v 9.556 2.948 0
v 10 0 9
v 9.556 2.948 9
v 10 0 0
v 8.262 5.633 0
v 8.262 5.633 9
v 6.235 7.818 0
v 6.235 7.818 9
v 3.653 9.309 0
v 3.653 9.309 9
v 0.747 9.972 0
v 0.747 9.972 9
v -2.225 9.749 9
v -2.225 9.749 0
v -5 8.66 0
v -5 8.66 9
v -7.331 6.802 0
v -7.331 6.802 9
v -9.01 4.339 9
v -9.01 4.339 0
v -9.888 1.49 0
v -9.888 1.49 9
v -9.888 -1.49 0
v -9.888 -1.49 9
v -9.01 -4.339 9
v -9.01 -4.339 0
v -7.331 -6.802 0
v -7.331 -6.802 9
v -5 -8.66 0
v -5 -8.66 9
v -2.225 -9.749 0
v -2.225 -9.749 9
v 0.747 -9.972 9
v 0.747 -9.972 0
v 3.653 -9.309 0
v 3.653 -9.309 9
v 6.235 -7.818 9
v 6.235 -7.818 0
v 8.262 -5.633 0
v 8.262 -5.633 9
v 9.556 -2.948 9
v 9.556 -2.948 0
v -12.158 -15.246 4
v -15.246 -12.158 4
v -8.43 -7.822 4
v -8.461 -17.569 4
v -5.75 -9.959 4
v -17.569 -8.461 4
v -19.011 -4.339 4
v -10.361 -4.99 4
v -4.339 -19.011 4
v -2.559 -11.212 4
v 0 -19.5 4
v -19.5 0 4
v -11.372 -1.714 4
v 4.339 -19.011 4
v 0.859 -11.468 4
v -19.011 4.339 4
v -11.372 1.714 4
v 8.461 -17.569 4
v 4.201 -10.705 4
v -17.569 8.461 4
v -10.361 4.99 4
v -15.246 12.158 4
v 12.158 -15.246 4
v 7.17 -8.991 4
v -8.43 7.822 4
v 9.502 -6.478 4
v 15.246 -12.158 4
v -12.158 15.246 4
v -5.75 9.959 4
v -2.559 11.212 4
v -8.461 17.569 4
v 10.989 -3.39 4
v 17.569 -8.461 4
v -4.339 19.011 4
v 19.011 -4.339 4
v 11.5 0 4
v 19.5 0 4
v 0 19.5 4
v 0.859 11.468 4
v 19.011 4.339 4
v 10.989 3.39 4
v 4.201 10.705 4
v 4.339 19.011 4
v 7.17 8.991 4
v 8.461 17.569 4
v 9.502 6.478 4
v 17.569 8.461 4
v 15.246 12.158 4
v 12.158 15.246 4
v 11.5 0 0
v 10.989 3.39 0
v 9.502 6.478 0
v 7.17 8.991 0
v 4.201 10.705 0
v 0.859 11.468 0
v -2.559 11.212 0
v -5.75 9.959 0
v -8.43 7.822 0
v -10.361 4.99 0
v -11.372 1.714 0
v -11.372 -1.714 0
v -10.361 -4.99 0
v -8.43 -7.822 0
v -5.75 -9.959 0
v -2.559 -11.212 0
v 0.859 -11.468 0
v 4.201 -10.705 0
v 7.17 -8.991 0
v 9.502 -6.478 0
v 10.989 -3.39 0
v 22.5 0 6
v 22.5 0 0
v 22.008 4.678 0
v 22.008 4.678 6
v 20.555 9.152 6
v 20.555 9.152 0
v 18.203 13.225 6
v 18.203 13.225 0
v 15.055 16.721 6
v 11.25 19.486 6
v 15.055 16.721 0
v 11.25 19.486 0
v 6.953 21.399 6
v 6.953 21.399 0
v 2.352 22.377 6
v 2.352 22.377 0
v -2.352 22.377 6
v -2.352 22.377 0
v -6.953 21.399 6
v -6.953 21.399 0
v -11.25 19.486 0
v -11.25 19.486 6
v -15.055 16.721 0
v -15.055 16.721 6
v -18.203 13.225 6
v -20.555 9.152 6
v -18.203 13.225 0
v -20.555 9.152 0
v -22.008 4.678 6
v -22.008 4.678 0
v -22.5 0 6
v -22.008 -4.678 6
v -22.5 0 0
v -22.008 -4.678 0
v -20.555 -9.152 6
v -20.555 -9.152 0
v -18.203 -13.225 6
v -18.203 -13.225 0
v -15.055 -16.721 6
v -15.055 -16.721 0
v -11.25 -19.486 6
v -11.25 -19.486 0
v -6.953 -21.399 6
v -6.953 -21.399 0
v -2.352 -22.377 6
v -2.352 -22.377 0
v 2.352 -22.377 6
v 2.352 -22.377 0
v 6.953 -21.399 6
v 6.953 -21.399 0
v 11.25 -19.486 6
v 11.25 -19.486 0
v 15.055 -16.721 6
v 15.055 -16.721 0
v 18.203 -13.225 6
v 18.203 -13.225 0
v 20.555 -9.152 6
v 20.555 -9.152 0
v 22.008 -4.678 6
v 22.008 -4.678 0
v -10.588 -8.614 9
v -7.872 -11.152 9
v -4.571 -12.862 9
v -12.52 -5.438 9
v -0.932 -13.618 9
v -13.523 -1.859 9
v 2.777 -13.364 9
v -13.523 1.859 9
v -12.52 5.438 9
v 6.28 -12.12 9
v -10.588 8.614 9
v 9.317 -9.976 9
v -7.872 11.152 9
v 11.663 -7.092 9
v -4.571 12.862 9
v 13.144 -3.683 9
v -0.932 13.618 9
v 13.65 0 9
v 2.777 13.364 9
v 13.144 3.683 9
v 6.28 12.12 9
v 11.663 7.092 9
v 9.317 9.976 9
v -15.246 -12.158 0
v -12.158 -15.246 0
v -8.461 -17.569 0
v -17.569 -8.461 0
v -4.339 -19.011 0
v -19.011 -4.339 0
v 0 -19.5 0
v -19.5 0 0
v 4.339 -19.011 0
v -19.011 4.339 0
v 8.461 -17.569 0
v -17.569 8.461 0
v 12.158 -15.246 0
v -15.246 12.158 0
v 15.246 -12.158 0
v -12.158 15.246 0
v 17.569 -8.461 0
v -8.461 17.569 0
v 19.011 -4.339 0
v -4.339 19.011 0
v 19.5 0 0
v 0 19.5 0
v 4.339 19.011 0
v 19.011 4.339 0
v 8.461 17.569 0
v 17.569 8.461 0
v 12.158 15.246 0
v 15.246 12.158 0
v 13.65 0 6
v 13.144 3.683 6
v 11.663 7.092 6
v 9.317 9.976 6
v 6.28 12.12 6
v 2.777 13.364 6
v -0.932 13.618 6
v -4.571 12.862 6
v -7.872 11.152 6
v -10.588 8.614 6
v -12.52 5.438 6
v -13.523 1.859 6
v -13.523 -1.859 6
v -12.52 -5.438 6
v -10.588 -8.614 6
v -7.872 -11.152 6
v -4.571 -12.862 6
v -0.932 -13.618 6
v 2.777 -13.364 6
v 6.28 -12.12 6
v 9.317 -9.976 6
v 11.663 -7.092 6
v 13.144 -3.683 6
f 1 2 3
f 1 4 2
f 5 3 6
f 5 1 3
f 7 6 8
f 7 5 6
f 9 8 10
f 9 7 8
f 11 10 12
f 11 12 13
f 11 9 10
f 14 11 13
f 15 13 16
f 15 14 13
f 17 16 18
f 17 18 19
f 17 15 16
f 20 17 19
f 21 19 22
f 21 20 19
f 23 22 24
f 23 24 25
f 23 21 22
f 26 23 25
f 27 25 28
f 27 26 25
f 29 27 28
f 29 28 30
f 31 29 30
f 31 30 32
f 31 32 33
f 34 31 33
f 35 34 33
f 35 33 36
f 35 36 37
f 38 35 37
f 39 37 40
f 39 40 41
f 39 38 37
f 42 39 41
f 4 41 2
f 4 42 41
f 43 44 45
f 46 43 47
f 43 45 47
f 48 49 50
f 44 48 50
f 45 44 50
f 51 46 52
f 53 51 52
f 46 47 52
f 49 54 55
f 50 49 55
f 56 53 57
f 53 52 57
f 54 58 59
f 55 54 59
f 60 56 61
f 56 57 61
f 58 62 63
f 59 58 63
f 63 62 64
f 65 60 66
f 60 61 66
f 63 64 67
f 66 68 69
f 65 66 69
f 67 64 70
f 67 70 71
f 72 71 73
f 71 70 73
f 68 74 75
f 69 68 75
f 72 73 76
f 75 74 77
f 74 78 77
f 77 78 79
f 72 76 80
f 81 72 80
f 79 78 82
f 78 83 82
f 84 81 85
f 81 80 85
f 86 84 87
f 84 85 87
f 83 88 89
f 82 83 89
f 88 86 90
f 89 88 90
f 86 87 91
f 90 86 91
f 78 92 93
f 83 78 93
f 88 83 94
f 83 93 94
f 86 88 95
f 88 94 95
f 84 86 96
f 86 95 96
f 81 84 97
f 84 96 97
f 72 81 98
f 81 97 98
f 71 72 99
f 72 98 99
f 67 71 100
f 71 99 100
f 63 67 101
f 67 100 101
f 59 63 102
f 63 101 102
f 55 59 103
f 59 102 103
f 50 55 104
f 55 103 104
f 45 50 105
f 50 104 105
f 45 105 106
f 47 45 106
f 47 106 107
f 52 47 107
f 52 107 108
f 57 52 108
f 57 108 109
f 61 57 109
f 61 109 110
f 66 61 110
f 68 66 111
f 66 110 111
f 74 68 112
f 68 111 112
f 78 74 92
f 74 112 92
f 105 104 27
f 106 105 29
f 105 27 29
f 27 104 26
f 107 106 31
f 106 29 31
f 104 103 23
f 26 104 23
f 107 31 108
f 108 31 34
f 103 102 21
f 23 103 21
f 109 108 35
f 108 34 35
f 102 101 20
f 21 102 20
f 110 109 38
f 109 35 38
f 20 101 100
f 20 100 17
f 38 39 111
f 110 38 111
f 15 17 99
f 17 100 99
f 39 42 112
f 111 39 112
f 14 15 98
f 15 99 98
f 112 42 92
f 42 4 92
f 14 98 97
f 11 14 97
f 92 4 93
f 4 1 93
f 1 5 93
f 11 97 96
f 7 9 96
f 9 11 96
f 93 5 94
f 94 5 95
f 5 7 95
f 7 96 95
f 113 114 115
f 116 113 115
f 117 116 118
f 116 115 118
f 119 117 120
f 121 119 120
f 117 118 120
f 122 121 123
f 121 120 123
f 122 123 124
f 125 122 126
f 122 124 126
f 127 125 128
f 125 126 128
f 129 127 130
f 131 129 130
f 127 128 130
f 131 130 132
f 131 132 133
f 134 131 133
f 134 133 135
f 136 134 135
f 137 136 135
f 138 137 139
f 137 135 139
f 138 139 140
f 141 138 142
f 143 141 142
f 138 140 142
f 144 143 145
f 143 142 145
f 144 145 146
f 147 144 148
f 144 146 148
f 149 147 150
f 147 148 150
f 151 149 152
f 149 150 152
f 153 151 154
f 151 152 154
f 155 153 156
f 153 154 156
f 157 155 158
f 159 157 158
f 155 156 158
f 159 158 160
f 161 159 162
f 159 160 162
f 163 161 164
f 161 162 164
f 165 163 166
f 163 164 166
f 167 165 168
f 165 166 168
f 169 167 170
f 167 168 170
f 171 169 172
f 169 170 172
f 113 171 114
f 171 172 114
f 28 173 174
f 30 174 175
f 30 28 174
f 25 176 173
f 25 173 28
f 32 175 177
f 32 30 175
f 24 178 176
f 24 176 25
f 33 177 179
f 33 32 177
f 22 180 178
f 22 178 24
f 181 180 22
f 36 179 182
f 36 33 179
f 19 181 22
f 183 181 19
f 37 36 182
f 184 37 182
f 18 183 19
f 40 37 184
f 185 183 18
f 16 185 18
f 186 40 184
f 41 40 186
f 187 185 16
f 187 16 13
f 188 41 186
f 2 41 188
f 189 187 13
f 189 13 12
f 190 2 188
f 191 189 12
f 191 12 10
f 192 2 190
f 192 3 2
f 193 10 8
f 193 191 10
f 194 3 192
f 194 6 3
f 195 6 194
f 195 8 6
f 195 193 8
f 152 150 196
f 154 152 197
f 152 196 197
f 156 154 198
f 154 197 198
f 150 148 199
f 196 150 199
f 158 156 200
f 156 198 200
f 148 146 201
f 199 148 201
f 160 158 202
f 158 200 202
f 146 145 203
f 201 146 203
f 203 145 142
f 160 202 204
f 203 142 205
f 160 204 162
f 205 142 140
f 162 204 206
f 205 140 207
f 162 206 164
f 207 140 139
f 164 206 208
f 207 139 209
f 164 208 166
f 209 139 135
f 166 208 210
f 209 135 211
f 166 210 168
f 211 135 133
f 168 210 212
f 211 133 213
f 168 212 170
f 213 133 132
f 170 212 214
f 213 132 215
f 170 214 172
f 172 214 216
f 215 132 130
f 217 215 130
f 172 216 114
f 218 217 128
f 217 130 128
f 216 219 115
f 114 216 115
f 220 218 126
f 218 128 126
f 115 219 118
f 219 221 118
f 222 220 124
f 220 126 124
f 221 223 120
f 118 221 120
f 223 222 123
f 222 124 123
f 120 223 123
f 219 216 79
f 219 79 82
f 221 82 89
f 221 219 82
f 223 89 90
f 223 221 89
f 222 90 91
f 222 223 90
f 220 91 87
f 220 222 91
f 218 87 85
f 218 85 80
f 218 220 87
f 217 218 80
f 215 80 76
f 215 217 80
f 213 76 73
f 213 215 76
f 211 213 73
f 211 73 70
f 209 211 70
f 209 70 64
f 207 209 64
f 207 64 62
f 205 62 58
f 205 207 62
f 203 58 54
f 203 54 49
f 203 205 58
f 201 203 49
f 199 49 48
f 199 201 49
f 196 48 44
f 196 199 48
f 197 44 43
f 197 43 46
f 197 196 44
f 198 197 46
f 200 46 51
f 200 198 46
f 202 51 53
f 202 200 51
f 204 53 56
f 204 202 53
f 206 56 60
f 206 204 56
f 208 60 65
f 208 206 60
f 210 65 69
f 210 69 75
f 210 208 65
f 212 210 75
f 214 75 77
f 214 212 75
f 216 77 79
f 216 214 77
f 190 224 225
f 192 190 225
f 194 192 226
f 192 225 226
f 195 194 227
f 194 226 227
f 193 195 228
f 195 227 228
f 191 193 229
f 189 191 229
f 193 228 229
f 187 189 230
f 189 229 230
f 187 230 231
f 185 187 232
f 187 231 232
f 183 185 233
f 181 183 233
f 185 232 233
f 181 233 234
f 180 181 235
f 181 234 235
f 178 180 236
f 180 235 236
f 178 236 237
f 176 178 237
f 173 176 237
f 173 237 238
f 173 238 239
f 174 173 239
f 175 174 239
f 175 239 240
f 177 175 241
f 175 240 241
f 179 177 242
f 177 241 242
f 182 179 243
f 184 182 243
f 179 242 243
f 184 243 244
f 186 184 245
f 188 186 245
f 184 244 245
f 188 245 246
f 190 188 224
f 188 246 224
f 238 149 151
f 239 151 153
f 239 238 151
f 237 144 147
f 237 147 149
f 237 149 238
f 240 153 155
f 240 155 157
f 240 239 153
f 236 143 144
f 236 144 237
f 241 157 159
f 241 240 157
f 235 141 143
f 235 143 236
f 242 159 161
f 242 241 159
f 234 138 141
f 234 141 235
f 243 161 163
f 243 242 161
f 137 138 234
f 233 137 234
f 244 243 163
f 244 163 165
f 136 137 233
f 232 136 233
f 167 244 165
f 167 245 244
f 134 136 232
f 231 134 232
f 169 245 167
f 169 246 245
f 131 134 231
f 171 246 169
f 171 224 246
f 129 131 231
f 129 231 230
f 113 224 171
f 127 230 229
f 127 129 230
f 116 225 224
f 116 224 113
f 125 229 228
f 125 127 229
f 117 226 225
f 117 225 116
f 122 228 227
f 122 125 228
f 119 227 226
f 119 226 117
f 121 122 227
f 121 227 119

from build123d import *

# Parameters (mm, degrees)
F0_R     = 22.5
F0_R_2   = 10
F1_DEPTH = 6
F2_R     = 13.65
F2_R_2   = 10
F3_DEPTH = 3
F4_R     = 19.5
F4_R_2   = 11.5
F5_DEPTH = 4


with BuildPart() as f1:
    # F0 (on Top) → F1 (new body)
    with BuildSketch(Plane.XY):
        Circle(F0_R)
        Circle(F0_R_2, mode=Mode.SUBTRACT)
    extrude(amount=F1_DEPTH)

    # F2 (on face) → F3 (join)
    with BuildSketch(Plane.XY.offset(6)):
        Circle(F2_R)
        Circle(F2_R_2, mode=Mode.SUBTRACT)
    extrude(amount=F3_DEPTH)

    # F4 (on face) → F5 (cut)
    with BuildSketch(Plane.XY):
        Circle(F4_R)
        Circle(F4_R_2, mode=Mode.SUBTRACT)
    extrude(amount=F5_DEPTH, mode=Mode.SUBTRACT)


solid = f1.part
